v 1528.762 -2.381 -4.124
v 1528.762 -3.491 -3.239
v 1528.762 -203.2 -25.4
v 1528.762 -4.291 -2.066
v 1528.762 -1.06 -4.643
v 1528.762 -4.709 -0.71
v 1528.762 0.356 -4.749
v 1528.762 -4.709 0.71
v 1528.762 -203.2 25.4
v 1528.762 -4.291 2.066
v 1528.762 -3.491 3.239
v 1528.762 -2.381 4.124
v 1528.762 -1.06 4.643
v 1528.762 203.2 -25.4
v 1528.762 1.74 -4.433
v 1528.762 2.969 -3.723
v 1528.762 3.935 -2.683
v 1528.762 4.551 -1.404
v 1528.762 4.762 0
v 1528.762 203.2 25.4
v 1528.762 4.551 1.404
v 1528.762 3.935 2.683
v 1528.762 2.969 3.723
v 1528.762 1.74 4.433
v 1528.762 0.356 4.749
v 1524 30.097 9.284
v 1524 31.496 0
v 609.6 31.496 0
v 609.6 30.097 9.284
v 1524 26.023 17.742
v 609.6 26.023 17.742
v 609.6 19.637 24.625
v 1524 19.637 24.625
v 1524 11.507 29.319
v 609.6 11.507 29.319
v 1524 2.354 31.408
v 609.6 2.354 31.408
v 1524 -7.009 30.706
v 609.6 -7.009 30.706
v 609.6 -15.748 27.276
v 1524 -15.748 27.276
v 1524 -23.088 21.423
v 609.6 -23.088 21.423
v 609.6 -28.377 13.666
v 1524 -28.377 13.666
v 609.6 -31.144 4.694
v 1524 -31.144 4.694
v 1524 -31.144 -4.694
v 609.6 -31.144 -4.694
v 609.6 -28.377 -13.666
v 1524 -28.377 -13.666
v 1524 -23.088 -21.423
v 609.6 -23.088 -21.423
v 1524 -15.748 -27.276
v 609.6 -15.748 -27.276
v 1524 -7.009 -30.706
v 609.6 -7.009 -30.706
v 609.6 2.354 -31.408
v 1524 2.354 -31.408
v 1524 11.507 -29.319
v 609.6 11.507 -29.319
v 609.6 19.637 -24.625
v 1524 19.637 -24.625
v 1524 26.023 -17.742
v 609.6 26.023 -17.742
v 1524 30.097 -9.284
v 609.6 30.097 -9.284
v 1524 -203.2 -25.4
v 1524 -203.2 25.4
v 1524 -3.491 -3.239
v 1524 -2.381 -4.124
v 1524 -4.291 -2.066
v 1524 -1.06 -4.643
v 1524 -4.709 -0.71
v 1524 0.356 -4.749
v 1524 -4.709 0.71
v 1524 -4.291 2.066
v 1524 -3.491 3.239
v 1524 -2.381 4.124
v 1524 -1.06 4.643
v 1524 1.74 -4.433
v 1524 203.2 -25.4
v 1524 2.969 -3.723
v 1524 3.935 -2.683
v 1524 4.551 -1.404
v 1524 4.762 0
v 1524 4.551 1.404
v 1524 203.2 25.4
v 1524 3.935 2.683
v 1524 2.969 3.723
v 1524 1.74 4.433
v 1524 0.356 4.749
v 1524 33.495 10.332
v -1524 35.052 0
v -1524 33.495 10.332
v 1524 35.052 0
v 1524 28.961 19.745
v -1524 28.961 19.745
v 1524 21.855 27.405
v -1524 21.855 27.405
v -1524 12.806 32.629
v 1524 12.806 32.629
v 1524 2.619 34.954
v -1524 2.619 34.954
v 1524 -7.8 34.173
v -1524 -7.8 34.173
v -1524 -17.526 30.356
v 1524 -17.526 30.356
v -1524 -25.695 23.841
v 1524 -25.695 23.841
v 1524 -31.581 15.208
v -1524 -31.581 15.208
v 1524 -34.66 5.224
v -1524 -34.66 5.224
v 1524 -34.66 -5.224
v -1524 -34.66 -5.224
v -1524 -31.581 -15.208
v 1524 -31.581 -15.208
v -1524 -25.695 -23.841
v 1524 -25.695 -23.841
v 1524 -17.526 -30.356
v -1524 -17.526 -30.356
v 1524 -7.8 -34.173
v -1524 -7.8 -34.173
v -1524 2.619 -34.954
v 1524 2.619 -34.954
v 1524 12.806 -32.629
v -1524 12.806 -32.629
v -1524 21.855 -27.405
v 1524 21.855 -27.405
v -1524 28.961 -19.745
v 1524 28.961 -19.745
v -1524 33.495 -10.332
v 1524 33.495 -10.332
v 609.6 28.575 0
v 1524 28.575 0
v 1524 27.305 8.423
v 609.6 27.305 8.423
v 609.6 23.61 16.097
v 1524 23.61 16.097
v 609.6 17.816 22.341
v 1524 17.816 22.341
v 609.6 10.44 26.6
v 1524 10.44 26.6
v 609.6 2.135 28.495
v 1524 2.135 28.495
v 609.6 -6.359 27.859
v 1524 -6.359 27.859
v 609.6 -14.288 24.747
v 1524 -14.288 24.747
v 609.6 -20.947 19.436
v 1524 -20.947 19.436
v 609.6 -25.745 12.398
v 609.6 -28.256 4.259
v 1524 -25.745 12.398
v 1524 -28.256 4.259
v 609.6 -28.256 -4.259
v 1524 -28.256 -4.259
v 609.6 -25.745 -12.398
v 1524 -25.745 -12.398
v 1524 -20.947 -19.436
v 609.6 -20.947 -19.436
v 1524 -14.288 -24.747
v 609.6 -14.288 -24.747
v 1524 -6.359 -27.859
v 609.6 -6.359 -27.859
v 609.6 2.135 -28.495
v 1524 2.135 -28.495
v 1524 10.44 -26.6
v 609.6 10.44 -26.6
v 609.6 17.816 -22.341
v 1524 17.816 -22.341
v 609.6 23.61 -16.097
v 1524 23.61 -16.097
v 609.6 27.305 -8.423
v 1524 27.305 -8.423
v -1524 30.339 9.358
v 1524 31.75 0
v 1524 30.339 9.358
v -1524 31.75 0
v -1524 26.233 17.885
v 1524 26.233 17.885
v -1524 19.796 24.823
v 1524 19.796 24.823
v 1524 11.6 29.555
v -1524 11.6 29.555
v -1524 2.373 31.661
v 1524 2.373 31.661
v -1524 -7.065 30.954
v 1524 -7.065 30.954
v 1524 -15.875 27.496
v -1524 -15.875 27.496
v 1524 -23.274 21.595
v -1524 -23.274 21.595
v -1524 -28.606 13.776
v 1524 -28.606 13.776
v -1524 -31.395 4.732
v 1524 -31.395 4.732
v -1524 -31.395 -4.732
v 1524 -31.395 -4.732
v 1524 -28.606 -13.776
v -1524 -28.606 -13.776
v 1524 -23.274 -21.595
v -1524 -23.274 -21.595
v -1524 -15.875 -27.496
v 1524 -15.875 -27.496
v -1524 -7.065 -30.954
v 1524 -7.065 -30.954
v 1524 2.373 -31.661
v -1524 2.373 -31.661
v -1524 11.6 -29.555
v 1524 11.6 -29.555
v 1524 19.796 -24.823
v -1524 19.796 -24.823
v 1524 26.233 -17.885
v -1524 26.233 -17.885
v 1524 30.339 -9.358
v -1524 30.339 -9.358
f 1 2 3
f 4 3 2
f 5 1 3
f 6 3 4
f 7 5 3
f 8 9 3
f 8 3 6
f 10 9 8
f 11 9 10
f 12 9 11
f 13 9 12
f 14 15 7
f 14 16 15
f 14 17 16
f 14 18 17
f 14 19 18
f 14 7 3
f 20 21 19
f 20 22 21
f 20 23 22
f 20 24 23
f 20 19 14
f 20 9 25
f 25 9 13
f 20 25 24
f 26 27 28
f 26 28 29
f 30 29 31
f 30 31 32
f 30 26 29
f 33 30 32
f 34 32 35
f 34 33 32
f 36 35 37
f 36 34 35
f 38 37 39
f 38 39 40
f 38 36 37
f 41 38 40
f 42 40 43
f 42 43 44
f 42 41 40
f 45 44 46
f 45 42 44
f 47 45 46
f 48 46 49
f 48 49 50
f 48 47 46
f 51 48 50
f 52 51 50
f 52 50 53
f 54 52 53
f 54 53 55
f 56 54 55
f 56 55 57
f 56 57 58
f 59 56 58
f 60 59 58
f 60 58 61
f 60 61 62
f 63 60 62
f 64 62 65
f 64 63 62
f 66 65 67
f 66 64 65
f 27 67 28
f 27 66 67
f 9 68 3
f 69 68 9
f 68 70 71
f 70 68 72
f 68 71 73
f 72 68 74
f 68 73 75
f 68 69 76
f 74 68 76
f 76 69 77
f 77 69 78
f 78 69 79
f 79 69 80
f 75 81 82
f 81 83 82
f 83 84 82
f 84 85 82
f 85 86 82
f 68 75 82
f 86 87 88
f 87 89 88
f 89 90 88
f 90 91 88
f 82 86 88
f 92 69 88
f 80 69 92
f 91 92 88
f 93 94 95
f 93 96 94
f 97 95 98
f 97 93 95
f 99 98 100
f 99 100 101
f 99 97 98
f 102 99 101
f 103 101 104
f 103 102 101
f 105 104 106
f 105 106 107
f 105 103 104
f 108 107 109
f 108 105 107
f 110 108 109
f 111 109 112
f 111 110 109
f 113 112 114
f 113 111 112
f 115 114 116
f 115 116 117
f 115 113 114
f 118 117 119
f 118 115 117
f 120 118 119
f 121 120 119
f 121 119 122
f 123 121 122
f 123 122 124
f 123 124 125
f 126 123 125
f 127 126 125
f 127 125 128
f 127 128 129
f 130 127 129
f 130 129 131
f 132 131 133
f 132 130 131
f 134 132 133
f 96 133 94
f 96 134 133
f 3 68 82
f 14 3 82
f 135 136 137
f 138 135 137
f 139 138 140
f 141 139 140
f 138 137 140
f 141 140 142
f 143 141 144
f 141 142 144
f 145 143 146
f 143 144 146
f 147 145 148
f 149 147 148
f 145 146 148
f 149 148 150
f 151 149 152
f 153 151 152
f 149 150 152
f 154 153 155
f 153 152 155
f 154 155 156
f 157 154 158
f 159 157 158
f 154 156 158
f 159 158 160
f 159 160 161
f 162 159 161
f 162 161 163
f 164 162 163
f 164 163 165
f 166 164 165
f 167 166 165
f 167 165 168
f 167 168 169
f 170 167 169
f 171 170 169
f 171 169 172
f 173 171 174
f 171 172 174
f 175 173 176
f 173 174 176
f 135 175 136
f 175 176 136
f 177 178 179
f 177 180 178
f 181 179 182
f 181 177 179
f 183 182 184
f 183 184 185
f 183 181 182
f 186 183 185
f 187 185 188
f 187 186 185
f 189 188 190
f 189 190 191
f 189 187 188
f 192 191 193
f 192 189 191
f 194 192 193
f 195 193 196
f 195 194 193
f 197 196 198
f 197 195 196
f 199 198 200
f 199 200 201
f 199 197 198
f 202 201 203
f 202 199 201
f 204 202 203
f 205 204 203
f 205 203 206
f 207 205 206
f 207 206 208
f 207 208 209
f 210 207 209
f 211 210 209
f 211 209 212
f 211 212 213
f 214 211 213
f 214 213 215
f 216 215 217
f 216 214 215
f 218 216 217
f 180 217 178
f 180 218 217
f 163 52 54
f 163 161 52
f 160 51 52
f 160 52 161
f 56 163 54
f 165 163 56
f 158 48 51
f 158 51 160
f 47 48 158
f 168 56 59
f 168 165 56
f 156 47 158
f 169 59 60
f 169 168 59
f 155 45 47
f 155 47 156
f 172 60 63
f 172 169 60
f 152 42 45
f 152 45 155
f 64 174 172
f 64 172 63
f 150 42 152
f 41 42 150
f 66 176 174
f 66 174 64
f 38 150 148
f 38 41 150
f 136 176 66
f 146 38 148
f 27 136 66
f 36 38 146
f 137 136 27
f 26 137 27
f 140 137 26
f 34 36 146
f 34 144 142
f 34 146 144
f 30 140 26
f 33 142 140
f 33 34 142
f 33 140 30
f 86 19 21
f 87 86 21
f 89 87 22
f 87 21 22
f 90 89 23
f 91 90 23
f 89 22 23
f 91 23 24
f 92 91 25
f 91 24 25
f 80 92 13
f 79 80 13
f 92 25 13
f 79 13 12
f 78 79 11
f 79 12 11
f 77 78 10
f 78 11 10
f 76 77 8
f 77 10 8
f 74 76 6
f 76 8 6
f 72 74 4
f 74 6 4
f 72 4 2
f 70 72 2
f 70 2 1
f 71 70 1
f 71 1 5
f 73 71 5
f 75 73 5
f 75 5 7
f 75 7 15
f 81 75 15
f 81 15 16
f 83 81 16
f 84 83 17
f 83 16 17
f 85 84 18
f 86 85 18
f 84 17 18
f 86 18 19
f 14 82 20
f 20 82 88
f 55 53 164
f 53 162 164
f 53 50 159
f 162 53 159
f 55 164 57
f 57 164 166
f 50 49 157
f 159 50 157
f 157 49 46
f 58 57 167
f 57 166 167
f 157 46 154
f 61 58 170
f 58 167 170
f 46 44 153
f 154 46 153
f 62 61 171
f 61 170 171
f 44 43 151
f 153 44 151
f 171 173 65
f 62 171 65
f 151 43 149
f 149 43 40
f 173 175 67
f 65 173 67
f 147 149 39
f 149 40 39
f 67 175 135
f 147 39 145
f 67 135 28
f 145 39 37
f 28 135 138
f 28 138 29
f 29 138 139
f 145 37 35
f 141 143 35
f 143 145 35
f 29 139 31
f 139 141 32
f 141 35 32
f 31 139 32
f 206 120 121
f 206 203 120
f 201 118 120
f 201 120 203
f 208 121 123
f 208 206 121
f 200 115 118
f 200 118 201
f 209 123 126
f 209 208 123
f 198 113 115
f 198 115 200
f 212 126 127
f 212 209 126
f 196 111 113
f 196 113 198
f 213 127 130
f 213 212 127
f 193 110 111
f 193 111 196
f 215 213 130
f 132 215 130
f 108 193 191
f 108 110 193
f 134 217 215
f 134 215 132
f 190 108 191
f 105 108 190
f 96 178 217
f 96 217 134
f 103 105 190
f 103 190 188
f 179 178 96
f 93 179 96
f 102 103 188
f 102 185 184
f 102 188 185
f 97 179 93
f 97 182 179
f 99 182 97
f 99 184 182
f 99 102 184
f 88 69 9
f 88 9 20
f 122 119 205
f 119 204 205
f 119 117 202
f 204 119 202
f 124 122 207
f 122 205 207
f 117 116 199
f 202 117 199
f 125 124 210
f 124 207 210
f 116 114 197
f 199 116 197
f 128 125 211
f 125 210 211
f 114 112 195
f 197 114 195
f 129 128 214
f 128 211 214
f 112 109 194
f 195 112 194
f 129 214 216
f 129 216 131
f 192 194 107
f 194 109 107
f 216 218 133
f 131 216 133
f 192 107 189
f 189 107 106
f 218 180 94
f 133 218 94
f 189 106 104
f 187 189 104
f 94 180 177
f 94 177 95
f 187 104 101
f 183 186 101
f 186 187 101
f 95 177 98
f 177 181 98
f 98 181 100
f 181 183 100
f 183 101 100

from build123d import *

# Parameters (mm, degrees)
F0_R     = 35.052
F0_R_2   = 31.75
F1_DEPTH = 1524
F2_R     = 31.496
F2_R_2   = 28.575
F3_DEPTH = 914.4
F4_W     = 406.4
F4_H     = 50.8
F5_DEPTH = 4.7625
F6_R     = 4.7625
F7_DEPTH = 4.7625


with BuildPart() as f1:
    # F0 (on Right) → F1 (new body, symmetric)
    with BuildSketch(Plane.YZ):
        Circle(F0_R)
        Circle(F0_R_2, mode=Mode.SUBTRACT)
    extrude(amount=F1_DEPTH, both=True)


with BuildPart() as f3:
    # F2 (on face) → F3 (new body)
    with BuildSketch(Plane.YZ.offset(1524)):
        Circle(F2_R)
        Circle(F2_R_2, mode=Mode.SUBTRACT)
    extrude(amount=-F3_DEPTH)


with BuildPart() as f5:
    # F4 (on face) → F5 (new body)
    with BuildSketch(Plane.YZ.offset(1524)):
        Rectangle(F4_W, F4_H)
    extrude(amount=F5_DEPTH)

    # F6 (on face) → F7 (cut, through all)
    with BuildSketch(Plane.YZ.offset(1528.7625)):
        Circle(F6_R)
    extrude(amount=-F7_DEPTH, mode=Mode.SUBTRACT)


solid = Compound([f1.part, f3.part, f5.part])
